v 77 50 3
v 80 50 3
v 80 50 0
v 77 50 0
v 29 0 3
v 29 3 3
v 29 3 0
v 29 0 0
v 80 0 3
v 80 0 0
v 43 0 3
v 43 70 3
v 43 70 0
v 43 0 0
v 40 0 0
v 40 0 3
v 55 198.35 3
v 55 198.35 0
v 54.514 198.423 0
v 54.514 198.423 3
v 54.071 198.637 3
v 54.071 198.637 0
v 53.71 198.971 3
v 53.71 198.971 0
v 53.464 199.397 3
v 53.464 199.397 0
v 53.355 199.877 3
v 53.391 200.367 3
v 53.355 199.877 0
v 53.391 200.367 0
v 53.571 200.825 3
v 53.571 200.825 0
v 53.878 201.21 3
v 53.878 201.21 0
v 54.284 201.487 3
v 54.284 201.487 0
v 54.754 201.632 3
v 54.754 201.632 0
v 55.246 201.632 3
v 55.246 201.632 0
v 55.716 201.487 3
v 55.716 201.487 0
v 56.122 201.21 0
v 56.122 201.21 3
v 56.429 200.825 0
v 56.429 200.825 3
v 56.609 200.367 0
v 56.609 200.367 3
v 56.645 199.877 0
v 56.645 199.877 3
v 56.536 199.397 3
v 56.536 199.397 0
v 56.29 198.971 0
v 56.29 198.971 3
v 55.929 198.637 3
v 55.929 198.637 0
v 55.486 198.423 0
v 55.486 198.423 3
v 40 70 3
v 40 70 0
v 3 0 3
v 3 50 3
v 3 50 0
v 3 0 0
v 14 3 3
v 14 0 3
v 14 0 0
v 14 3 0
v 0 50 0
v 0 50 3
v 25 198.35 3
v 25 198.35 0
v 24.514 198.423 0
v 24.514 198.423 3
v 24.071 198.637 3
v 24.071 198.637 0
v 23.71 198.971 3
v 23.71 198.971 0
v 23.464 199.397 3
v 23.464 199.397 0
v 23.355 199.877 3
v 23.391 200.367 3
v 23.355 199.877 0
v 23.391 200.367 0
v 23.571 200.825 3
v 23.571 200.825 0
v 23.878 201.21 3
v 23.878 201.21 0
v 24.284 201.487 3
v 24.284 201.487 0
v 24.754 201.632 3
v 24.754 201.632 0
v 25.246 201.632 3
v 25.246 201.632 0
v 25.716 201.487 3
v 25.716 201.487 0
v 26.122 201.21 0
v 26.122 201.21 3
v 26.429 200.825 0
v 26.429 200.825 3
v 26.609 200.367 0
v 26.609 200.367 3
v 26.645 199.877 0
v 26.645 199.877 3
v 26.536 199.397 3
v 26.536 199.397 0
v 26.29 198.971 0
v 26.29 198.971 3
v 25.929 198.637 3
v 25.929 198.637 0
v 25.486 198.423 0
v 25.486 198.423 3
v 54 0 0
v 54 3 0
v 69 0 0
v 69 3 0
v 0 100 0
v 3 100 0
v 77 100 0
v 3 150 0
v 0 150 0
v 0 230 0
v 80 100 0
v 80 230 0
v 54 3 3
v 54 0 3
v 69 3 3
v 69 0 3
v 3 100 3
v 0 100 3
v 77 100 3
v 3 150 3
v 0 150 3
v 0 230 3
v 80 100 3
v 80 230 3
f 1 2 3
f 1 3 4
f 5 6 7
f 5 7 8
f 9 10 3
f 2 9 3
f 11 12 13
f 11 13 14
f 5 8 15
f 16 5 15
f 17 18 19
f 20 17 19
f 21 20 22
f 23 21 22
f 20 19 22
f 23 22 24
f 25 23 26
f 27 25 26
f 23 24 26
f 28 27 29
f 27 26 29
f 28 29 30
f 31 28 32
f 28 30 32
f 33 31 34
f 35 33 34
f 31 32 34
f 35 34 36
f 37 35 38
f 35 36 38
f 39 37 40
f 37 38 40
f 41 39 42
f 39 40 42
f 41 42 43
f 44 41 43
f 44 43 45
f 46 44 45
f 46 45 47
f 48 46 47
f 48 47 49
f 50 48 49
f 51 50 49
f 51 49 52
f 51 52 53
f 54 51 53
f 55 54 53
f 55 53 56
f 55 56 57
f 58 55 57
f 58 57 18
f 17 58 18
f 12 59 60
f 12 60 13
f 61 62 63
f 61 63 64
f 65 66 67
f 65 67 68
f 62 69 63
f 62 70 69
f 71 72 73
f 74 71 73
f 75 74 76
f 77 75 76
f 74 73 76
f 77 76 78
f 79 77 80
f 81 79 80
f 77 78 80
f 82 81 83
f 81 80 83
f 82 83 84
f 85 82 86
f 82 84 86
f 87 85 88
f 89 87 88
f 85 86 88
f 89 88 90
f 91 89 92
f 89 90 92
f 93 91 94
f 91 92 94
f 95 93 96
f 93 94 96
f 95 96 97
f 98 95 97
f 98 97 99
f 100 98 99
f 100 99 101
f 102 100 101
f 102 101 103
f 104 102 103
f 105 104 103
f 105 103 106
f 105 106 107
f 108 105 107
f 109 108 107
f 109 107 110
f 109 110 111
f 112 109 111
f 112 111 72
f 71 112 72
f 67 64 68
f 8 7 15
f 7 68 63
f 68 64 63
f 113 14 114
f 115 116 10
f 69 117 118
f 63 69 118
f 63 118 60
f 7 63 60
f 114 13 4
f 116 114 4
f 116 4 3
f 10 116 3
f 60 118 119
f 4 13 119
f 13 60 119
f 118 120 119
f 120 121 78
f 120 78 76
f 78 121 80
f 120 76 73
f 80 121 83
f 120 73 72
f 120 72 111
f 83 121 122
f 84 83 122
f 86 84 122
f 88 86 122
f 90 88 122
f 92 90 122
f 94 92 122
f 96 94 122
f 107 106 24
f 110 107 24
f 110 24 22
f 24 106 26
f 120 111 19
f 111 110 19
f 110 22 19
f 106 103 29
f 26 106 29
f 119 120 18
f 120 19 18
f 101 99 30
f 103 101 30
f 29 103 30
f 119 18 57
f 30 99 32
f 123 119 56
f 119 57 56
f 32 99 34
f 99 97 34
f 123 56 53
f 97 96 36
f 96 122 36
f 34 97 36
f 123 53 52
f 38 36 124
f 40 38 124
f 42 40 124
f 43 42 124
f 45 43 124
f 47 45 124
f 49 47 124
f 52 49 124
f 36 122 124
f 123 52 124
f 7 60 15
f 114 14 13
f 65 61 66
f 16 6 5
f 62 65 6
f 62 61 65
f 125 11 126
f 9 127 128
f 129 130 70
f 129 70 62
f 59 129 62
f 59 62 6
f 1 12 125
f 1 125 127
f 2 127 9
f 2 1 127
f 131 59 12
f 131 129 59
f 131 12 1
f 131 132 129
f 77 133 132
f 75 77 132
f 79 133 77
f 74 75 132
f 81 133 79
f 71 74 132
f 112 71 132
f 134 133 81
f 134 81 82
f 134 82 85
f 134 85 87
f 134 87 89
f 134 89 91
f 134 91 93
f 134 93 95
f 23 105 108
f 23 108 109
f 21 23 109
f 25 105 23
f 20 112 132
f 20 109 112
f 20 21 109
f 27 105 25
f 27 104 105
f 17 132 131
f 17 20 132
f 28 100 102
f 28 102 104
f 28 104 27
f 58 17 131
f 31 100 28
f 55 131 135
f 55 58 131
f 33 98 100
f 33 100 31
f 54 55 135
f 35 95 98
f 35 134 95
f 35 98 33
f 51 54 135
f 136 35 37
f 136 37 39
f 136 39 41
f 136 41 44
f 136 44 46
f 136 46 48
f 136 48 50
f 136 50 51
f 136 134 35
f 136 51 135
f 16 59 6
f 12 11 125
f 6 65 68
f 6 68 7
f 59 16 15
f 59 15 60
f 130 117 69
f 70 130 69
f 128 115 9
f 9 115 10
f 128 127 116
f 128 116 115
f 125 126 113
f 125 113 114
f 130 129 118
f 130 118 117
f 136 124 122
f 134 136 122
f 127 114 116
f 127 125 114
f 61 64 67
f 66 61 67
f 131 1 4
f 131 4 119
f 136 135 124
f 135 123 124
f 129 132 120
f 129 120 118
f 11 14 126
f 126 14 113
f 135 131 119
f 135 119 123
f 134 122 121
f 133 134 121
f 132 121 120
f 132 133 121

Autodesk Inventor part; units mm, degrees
ref_plane "YZ Plane" through (0, 0, 0) normal (1, 0, 0) x (0, 1, 0)
ref_plane "XZ Plane" through (0, 0, 0) normal (0, 1, 0) x (-1, 0, 0)
ref_plane "XY Plane" through (0, 0, 0) normal (0, 0, 1) x (1, 0, 0)
sketch "Boceto1" plane through (0, 0, 0) normal (0, 0, 1) x (1, 0, 0)
  line L0 (0, 0) -> (80, 0)
  line L1 (80, 0) -> (80, 230)
  line L2 (80, 230) -> (0, 230)
  line L3 (0, 230) -> (0, 0)
  dimension "d0" = 80
  dimension "d1" = 230
extrude "Extrusión1" add sketch "Boceto1" along normal blind 3
sketch "Boceto2" plane through (0, 0, 3) normal (0, 0, 1) x (1, 0, 0)
  line L0 (0, 0) -> (80, 0) construction
  line L1 (80, 0) -> (80, 230) construction
  line L2 (80, 230) -> (0, 230) construction
  line L3 (0, 230) -> (0, 0) construction
  line L4 (3, 0) -> (0, 0)
  line L5 (0, 0) -> (0, 50)
  line L6 (0, 50) -> (3, 50)
  line L7 (3, 50) -> (3, 0)
  line L8 (0, 230) -> (17.5445, 230)
  line L9 (77, 100) -> (80, 100)
  line L10 (80, 100) -> (80, 50)
  line L11 (80, 50) -> (77, 50)
  line L12 (77, 50) -> (77, 100)
  line L13 (80, 0) -> (80, 230) construction
  line L14 (0, 150) -> (3, 150)
  line L15 (3, 150) -> (3, 100)
  line L16 (3, 100) -> (0, 100)
  line L17 (0, 100) -> (0, 150)
  line L18 (0, 230) -> (0, 0) construction
  point P0 (80, 115)
  dimension "d4" = 3
  dimension "d5" = 50
  dimension "d8" = 50
  dimension "d9" = 3
  dimension "d16" = 50
  dimension "d17" = 3
  dimension "d18" = 50
  dimension "d19" = 50
extrude "Extrusión2" cut sketch "Boceto2" against normal blind 3
sketch "Boceto3" plane through (0, 0, 3) normal (0, 0, 1) x (1, 0, 0)
  line L0 (3, 50) -> (3, 0) construction
  line L1 (3, 0) -> (80, 0) construction
  line L2 (80, 0) -> (80, 50) construction
  line L3 (80, 50) -> (77, 50) construction
  line L4 (77, 50) -> (77, 100) construction
  line L5 (77, 100) -> (80, 100) construction
  line L6 (80, 100) -> (80, 230) construction
  line L7 (80, 230) -> (0, 230) construction
  line L8 (0, 230) -> (0, 150) construction
  line L9 (0, 50) -> (3, 50) construction
  line L10 (40, 70) -> (43, 70)
  line L11 (43, 70) -> (43, 0)
  line L12 (43, 0) -> (40, 0)
  line L13 (40, 0) -> (40, 70)
  line L14 (3, 0) -> (80, 0) construction
  line L15 (0, 150) -> (3, 150) projected
  line L16 (3, 150) -> (3, 100) projected
  line L17 (3, 100) -> (0, 100) projected
  line L18 (0, 100) -> (0, 50) projected
  point P0 (0, 0)
  point P1 (41.5, 0)
  point P2 (41.5, 0)
  dimension "d12" = 3
  dimension "d13" = 70
extrude "Extrusión3" cut sketch "Boceto3" against normal blind 10
sketch "Boceto4" plane through (0, 0, 3) normal (0, 0, 1) x (1, 0, 0)
  line L0 (43, 70) -> (43, 0) construction
  line L1 (43, 0) -> (80, 0) construction
  line L2 (80, 0) -> (80, 50) construction
  line L3 (80, 50) -> (77, 50) construction
  line L4 (77, 50) -> (77, 100) construction
  line L5 (77, 100) -> (80, 100) construction
  line L6 (80, 100) -> (80, 230) construction
  line L7 (80, 230) -> (0, 230) construction
  line L8 (0, 230) -> (0, 150) construction
  line L9 (0, 150) -> (3, 150) construction
  line L10 (3, 150) -> (3, 100) construction
  line L11 (3, 100) -> (0, 100) construction
  line L12 (0, 100) -> (0, 50) construction
  line L13 (0, 50) -> (3, 50) construction
  line L14 (3, 50) -> (3, 0) construction
  line L15 (3, 0) -> (40, 0) construction
  line L16 (40, 0) -> (40, 70) construction
  line L17 (40, 70) -> (43, 70) construction
  point P0 (0, 0)
  point P1 (25, 200)
  point P2 (55, 200)
  dimension "d20" = 30
  dimension "d21" = 30
  dimension "d23" = 25
  dimension "d24" = 30
hole "Agujero1" at (25, 200, 3) at (55, 200, 3) direction (0, 0, -1) diameter 3.3 end through all both
sketch "Boceto5" plane through (0, 0, 3) normal (0, 0, 1) x (1, 0, 0)
  circle A0 centre (25, 200) radius 1.65 construction
  circle A1 centre (55, 200) radius 1.65 construction
  line L0 (43, 70) -> (43, 0) construction
  line L1 (43, 0) -> (80, 0) construction
  line L2 (80, 0) -> (80, 50) construction
  line L3 (80, 50) -> (77, 50) construction
  line L4 (77, 50) -> (77, 100) construction
  line L5 (77, 100) -> (80, 100) construction
  line L6 (80, 100) -> (80, 230) construction
  line L7 (80, 230) -> (0, 230) construction
  line L8 (0, 230) -> (0, 150) construction
  line L9 (0, 150) -> (3, 150) construction
  line L10 (3, 150) -> (3, 100) construction
  line L11 (3, 100) -> (0, 100) construction
  line L12 (0, 100) -> (0, 50) construction
  line L13 (0, 50) -> (3, 50) construction
  line L14 (3, 50) -> (3, 0) construction
  line L15 (3, 0) -> (40, 0) construction
  line L16 (40, 0) -> (40, 70) construction
  line L17 (40, 70) -> (43, 70) construction
  line L18 (14, 3) -> (29, 3)
  line L19 (29, 3) -> (29, 0)
  line L20 (29, 0) -> (14, 0)
  line L21 (14, 0) -> (14, 3)
  line L22 (54, 3) -> (69, 3)
  line L23 (69, 3) -> (69, 0)
  line L24 (69, 0) -> (54, 0)
  line L25 (54, 0) -> (54, 3)
  line L26 (3, 0) -> (40, 0) construction
  line L27 (43, 0) -> (80, 0) construction
  point P0 (0, 0)
  point P1 (21.5, 0)
  point P2 (21.5, 0)
  point P3 (61.5, 0)
  point P4 (61.5, 0)
  dimension "d32" = 3
  dimension "d33" = 3
  dimension "d35" = 15
  dimension "d36" = 15
extrude "Extrusión4" cut sketch "Boceto5" against normal blind 10
equation "\"d8\" = d7"
equation "\"d9\" = d4"
equation "\"d21\" = d20"
equation "\"d7\" = d5"
properties part number "Pared Garita3"
